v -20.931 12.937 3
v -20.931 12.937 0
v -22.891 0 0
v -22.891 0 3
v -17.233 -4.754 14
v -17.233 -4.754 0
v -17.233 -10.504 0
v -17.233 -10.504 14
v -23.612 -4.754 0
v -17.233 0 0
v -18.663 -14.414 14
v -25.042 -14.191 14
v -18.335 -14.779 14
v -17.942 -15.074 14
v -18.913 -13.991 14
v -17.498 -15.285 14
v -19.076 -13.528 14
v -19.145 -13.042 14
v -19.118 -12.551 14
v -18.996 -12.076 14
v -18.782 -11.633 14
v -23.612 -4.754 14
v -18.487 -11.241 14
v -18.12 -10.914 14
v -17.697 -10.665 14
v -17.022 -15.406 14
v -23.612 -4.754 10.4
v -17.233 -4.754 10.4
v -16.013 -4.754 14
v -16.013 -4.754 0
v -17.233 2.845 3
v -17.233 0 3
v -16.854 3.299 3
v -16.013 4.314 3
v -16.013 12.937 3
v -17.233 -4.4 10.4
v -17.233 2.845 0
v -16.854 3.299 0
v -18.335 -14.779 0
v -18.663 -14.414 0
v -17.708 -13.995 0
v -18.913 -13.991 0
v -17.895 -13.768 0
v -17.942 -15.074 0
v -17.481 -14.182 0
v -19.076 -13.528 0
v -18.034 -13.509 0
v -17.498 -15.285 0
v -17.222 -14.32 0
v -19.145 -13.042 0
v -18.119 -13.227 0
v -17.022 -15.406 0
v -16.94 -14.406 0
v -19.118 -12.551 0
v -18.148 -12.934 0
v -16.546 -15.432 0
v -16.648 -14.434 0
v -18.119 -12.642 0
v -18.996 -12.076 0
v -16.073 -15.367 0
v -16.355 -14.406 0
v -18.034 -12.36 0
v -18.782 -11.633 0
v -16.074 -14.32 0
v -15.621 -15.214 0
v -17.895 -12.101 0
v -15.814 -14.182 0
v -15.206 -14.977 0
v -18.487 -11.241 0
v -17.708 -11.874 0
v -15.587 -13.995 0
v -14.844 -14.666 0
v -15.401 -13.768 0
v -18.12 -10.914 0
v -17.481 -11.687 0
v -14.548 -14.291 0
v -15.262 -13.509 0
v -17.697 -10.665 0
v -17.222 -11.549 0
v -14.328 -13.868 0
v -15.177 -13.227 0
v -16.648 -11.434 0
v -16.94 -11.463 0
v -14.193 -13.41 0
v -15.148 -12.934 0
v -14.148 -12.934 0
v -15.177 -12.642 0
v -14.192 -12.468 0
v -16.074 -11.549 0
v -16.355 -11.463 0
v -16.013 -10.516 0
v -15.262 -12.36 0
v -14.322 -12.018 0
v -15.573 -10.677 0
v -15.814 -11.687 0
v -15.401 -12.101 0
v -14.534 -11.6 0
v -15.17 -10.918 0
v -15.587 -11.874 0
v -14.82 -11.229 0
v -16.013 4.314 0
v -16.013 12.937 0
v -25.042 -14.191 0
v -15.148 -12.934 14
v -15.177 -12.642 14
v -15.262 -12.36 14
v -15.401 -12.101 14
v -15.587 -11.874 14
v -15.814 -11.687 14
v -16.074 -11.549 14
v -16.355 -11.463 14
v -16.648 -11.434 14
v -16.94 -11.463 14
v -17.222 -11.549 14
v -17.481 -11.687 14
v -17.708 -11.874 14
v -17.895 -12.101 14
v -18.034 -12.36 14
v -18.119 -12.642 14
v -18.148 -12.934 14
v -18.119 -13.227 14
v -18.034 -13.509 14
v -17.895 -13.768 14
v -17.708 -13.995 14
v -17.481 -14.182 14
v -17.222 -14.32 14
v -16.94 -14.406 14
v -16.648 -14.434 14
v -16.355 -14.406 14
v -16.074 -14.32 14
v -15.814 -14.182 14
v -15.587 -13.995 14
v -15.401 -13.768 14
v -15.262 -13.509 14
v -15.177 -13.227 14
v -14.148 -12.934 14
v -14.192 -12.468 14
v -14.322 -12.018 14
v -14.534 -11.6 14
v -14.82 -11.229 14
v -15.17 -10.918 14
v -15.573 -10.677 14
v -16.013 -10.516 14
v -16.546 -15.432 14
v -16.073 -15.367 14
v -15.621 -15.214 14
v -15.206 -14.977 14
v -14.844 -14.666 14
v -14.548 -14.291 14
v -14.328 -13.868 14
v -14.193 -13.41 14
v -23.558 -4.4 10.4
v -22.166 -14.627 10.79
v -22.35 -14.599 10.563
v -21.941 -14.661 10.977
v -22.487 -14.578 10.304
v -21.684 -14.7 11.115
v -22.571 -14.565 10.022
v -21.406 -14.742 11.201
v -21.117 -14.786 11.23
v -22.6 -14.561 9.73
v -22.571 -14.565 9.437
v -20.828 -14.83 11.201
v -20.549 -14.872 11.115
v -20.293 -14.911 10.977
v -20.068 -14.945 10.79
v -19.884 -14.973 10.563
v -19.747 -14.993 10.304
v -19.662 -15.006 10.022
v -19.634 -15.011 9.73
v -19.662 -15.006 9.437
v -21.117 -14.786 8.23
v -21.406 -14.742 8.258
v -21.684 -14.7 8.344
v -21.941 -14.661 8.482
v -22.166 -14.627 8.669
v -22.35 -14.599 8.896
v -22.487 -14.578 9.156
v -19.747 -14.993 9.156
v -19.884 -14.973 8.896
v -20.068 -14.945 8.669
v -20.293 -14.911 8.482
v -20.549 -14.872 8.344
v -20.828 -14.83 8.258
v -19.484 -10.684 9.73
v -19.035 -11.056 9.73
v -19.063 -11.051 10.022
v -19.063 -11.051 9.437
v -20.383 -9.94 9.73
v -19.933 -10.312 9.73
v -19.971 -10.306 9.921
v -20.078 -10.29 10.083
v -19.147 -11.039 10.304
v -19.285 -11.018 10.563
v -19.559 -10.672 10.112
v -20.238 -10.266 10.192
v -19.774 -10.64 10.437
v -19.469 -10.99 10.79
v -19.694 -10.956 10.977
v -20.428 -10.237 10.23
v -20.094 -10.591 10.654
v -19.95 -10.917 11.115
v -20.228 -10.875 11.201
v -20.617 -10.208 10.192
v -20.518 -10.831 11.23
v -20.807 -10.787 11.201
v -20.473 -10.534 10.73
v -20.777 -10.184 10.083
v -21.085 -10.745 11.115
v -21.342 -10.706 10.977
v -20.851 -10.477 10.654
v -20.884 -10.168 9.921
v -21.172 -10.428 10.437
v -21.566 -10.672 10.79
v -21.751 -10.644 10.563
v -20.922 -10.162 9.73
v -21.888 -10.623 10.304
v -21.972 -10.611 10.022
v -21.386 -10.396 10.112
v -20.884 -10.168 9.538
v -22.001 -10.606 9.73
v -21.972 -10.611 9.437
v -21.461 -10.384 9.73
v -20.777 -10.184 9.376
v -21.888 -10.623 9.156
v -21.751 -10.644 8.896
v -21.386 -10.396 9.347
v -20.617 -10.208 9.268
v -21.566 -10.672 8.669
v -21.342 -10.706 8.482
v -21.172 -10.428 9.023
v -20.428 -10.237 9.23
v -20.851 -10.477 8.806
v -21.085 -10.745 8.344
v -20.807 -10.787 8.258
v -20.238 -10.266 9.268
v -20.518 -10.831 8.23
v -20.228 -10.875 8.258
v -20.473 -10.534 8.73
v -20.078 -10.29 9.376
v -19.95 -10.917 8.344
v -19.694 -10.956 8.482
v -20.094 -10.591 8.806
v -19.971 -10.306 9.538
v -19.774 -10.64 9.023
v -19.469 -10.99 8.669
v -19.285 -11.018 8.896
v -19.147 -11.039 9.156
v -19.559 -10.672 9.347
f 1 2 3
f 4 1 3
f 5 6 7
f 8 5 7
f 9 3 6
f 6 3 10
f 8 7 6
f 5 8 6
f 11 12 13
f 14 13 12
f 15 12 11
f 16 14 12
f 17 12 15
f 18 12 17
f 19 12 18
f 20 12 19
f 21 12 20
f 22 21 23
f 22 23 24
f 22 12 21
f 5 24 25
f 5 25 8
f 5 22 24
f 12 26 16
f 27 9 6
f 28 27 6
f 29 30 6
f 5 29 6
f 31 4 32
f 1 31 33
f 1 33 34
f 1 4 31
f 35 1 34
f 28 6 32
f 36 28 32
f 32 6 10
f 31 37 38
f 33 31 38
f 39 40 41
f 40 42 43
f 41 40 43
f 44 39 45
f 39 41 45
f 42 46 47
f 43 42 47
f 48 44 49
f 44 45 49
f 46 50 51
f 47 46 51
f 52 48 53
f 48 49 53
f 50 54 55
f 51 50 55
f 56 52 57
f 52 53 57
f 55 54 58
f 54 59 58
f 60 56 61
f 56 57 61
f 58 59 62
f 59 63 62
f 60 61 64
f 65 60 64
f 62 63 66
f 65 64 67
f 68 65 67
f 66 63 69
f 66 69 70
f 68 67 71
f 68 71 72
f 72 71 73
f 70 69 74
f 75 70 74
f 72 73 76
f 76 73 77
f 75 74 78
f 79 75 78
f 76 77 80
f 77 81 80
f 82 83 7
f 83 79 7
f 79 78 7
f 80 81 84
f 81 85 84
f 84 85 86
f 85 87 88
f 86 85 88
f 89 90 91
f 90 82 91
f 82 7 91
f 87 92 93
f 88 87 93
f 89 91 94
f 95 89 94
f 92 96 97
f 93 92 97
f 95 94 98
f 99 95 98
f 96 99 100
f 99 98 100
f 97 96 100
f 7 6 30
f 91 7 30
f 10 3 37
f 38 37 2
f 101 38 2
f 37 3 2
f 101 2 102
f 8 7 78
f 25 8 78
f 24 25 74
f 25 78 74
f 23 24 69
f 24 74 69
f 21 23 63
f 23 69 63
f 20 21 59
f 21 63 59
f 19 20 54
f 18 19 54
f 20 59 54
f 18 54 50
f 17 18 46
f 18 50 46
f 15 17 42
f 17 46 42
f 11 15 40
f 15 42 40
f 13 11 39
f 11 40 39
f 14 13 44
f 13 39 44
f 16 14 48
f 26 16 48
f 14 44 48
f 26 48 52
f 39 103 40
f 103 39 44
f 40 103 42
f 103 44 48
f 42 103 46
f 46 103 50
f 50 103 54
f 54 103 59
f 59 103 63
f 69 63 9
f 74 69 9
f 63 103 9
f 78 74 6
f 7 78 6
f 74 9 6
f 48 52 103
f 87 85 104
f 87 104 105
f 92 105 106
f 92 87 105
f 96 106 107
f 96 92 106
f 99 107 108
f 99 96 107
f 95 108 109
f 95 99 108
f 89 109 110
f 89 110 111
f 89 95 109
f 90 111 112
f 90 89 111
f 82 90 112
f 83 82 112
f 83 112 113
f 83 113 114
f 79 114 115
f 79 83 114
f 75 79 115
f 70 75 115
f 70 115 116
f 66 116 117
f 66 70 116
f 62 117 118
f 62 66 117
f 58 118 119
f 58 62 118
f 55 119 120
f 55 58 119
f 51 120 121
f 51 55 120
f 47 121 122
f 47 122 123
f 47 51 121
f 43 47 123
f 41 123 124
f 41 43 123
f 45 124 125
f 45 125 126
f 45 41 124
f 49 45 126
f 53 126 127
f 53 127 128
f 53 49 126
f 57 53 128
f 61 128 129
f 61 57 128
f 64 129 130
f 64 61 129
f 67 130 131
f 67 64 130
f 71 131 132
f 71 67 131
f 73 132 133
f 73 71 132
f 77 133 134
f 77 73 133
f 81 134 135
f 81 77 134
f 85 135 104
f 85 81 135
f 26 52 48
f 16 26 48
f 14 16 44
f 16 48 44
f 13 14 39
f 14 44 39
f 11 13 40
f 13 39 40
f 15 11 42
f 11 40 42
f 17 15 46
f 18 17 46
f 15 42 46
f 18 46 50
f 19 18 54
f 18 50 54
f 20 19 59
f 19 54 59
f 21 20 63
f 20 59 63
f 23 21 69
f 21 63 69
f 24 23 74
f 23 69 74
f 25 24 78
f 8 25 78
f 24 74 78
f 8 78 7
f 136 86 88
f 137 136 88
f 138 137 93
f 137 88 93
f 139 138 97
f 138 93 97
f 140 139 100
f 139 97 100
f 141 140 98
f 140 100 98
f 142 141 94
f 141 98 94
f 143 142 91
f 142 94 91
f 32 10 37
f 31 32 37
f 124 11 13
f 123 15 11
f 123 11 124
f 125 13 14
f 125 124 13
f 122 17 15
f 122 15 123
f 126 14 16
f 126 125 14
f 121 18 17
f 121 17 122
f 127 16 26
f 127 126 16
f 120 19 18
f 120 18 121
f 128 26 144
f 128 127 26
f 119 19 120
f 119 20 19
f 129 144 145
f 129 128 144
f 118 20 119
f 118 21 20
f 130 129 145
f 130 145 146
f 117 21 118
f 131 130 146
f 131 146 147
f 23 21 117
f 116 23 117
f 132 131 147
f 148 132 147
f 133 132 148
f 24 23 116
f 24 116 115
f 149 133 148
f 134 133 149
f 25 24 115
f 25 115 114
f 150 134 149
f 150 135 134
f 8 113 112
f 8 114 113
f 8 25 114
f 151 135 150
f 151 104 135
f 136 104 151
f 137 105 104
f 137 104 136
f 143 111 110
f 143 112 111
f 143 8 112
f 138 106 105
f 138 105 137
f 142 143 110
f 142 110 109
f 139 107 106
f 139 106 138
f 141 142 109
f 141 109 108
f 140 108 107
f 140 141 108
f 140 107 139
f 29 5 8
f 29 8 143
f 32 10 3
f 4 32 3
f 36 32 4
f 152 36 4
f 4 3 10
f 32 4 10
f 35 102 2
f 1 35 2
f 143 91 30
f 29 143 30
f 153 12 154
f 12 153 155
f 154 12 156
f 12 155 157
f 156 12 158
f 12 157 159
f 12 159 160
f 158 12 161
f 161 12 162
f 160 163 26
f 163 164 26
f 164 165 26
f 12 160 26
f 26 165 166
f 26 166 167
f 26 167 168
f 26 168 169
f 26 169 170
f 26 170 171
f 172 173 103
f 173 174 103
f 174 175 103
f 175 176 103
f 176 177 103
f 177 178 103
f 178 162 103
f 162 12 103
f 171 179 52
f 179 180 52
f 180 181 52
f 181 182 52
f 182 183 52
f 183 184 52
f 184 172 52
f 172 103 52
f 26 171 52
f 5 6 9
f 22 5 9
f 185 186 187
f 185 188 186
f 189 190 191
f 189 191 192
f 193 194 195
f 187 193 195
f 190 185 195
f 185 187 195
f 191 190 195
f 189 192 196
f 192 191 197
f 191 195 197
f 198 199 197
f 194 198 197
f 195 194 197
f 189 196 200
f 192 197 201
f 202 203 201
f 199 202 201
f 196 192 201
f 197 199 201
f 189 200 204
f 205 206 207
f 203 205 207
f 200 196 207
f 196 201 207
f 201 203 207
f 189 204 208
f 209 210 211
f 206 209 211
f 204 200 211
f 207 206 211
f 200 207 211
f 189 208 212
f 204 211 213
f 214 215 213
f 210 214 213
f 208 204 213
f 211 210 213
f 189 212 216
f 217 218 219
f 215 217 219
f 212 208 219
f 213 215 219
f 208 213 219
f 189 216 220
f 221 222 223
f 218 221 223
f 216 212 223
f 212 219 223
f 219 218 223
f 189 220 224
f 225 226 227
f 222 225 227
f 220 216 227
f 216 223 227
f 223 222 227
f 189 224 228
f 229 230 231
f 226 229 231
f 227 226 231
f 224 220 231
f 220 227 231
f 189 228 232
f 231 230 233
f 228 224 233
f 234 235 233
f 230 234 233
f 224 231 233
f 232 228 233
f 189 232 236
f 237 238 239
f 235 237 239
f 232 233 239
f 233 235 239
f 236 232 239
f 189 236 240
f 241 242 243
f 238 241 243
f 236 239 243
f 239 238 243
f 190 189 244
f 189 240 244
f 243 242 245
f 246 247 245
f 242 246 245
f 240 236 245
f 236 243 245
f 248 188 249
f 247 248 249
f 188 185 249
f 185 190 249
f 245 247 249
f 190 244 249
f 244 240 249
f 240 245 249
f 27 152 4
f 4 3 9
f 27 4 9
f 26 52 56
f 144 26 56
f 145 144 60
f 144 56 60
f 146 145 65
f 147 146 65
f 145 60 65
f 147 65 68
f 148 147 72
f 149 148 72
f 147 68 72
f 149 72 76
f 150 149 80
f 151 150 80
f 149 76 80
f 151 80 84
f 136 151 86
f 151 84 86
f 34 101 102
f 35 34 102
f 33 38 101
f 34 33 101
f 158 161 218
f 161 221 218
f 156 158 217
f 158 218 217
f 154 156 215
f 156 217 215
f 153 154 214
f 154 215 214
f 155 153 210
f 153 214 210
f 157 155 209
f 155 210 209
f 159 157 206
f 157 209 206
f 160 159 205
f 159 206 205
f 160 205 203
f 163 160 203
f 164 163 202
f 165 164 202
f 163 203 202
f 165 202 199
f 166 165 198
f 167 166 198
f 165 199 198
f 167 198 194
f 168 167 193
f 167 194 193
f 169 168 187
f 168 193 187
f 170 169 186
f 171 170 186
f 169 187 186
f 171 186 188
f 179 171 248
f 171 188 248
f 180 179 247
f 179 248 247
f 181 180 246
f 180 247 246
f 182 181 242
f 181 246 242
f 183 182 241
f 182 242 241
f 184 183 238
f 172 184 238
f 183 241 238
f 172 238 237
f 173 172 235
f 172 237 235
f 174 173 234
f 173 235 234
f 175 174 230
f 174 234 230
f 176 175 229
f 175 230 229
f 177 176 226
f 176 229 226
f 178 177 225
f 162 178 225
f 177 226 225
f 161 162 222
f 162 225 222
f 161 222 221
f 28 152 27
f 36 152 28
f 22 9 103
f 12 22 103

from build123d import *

# Parameters (mm, degrees)
F0_R     = 1.5
F1_DEPTH = 14
F2_DEPTH = 14
F3_DEPTH = 10.4
F4_DEPTH = 3
F5_SIZE2 = 4.4
F5_SIZE  = 7.4
F7_D     = 3
F7_DEPTH = 4
F7_TIP   = 0.9012909285


with BuildPart() as f1:
    # F0 (on Top) → F1 (new body)
    with BuildSketch(Plane.XY):
        with BuildLine():
            ThreePointArc((-14.1477591004, -12.9344832561), (-14.668169588, -11.4076481759), (-16.0127393901, -10.5164778865))
            ThreePointArc((-16.0127393901, -10.5164778865), (-16.6218795262, -10.4346172102), (-17.2325838357, -10.5038495879))
            ThreePointArc((-17.2325838357, -10.5038495879), (-19.1454623716, -13.0416204075), (-17.022298185, -15.4062681323))
            ThreePointArc((-17.022298185, -15.4062681323), (-15.0177817557, -14.8300501517), (-14.1477591004, -12.9344832561))
        make_face()
        with Locations((-16.6477591004, -12.9344832561)):
            Circle(F0_R, mode=Mode.SUBTRACT)
        with BuildLine():
            Line((-16.0127393901, -10.5164778865), (-16.0127393901, -4.7539807856))
            Line((-16.0127393901, -4.7539807856), (-17.2325838357, -4.7539807856))
            Line((-17.2325838357, -4.7539807856), (-17.2325838357, -10.5038495879))
            ThreePointArc((-17.2325838357, -10.5038495879), (-16.6218795262, -10.4346172102), (-16.0127393901, -10.5164778865))
        make_face()
    extrude(amount=F1_DEPTH)


with BuildPart() as f2:
    # F0 (on Top) → F2 (new body)
    with BuildSketch(Plane.XY):
        with BuildLine():
            Line((-17.2325838357, -10.5038495879), (-17.2325838357, -4.7539807856))
            Line((-17.2325838357, -4.7539807856), (-23.6115734637, -4.7539807856))
            Line((-23.6115734637, -4.7539807856), (-25.0415470069, -14.1911453514))
            Line((-25.0415470069, -14.1911453514), (-17.022298185, -15.4062681323))
            ThreePointArc((-17.022298185, -15.4062681323), (-19.1454623716, -13.0416204075), (-17.2325838357, -10.5038495879))
        make_face()
    extrude(amount=F2_DEPTH)

    # F7
    with Locations(Plane(origin=(-2.6641112831, -17.5819033302, 0), x_dir=(0.9887139505, -0.1498156338, 0), z_dir=(-0.1498156338, -0.9887139505, 0))):
        with Locations((-18.6634268612, 9.7296228632)):
            Hole(F7_D / 2, depth=F7_DEPTH)
            with Locations((0, 0, -(F7_DEPTH + F7_TIP / 2))):  # 118° drill point
                Cone(0, F7_D / 2, F7_TIP, mode=Mode.SUBTRACT)


with BuildPart() as f3:
    # F0 (on Top) → F3 (new body)
    with BuildSketch(Plane.XY):
        Polygon((-23.6115734637, -4.7539807856), (-17.2325838357, -4.7539807856), (-17.2325838357, 0), (-22.8912229071, 0), align=None)
    extrude(amount=F3_DEPTH)

    # F5
    f5_edges = [f3.edges().sort_by_distance(p)[0] for p in [
        (-20.061903, 0, 10.4),
    ]]
    f5_side = f3.faces().sort_by_distance((-20.061903, 0, 5.2))[0]
    chamfer(f5_edges, length=F5_SIZE, length2=F5_SIZE2, reference=f5_side)


with BuildPart() as f4:
    # F0 (on Top) → F4 (new body)
    with BuildSketch(Plane.XY):
        Polygon((-22.8912229071, 0), (-17.2325838357, 0), (-17.2325838357, 2.8447443619), (-16.8538745493, 3.2991392072), (-16.0127393901, 4.3138256297), (-16.0127393901, 12.936996296), (-19.2249324173, 12.936996296), (-20.9309346974, 12.936996296), align=None)
    extrude(amount=F4_DEPTH)


solid = Compound([f1.part, f2.part, f3.part, f4.part])
